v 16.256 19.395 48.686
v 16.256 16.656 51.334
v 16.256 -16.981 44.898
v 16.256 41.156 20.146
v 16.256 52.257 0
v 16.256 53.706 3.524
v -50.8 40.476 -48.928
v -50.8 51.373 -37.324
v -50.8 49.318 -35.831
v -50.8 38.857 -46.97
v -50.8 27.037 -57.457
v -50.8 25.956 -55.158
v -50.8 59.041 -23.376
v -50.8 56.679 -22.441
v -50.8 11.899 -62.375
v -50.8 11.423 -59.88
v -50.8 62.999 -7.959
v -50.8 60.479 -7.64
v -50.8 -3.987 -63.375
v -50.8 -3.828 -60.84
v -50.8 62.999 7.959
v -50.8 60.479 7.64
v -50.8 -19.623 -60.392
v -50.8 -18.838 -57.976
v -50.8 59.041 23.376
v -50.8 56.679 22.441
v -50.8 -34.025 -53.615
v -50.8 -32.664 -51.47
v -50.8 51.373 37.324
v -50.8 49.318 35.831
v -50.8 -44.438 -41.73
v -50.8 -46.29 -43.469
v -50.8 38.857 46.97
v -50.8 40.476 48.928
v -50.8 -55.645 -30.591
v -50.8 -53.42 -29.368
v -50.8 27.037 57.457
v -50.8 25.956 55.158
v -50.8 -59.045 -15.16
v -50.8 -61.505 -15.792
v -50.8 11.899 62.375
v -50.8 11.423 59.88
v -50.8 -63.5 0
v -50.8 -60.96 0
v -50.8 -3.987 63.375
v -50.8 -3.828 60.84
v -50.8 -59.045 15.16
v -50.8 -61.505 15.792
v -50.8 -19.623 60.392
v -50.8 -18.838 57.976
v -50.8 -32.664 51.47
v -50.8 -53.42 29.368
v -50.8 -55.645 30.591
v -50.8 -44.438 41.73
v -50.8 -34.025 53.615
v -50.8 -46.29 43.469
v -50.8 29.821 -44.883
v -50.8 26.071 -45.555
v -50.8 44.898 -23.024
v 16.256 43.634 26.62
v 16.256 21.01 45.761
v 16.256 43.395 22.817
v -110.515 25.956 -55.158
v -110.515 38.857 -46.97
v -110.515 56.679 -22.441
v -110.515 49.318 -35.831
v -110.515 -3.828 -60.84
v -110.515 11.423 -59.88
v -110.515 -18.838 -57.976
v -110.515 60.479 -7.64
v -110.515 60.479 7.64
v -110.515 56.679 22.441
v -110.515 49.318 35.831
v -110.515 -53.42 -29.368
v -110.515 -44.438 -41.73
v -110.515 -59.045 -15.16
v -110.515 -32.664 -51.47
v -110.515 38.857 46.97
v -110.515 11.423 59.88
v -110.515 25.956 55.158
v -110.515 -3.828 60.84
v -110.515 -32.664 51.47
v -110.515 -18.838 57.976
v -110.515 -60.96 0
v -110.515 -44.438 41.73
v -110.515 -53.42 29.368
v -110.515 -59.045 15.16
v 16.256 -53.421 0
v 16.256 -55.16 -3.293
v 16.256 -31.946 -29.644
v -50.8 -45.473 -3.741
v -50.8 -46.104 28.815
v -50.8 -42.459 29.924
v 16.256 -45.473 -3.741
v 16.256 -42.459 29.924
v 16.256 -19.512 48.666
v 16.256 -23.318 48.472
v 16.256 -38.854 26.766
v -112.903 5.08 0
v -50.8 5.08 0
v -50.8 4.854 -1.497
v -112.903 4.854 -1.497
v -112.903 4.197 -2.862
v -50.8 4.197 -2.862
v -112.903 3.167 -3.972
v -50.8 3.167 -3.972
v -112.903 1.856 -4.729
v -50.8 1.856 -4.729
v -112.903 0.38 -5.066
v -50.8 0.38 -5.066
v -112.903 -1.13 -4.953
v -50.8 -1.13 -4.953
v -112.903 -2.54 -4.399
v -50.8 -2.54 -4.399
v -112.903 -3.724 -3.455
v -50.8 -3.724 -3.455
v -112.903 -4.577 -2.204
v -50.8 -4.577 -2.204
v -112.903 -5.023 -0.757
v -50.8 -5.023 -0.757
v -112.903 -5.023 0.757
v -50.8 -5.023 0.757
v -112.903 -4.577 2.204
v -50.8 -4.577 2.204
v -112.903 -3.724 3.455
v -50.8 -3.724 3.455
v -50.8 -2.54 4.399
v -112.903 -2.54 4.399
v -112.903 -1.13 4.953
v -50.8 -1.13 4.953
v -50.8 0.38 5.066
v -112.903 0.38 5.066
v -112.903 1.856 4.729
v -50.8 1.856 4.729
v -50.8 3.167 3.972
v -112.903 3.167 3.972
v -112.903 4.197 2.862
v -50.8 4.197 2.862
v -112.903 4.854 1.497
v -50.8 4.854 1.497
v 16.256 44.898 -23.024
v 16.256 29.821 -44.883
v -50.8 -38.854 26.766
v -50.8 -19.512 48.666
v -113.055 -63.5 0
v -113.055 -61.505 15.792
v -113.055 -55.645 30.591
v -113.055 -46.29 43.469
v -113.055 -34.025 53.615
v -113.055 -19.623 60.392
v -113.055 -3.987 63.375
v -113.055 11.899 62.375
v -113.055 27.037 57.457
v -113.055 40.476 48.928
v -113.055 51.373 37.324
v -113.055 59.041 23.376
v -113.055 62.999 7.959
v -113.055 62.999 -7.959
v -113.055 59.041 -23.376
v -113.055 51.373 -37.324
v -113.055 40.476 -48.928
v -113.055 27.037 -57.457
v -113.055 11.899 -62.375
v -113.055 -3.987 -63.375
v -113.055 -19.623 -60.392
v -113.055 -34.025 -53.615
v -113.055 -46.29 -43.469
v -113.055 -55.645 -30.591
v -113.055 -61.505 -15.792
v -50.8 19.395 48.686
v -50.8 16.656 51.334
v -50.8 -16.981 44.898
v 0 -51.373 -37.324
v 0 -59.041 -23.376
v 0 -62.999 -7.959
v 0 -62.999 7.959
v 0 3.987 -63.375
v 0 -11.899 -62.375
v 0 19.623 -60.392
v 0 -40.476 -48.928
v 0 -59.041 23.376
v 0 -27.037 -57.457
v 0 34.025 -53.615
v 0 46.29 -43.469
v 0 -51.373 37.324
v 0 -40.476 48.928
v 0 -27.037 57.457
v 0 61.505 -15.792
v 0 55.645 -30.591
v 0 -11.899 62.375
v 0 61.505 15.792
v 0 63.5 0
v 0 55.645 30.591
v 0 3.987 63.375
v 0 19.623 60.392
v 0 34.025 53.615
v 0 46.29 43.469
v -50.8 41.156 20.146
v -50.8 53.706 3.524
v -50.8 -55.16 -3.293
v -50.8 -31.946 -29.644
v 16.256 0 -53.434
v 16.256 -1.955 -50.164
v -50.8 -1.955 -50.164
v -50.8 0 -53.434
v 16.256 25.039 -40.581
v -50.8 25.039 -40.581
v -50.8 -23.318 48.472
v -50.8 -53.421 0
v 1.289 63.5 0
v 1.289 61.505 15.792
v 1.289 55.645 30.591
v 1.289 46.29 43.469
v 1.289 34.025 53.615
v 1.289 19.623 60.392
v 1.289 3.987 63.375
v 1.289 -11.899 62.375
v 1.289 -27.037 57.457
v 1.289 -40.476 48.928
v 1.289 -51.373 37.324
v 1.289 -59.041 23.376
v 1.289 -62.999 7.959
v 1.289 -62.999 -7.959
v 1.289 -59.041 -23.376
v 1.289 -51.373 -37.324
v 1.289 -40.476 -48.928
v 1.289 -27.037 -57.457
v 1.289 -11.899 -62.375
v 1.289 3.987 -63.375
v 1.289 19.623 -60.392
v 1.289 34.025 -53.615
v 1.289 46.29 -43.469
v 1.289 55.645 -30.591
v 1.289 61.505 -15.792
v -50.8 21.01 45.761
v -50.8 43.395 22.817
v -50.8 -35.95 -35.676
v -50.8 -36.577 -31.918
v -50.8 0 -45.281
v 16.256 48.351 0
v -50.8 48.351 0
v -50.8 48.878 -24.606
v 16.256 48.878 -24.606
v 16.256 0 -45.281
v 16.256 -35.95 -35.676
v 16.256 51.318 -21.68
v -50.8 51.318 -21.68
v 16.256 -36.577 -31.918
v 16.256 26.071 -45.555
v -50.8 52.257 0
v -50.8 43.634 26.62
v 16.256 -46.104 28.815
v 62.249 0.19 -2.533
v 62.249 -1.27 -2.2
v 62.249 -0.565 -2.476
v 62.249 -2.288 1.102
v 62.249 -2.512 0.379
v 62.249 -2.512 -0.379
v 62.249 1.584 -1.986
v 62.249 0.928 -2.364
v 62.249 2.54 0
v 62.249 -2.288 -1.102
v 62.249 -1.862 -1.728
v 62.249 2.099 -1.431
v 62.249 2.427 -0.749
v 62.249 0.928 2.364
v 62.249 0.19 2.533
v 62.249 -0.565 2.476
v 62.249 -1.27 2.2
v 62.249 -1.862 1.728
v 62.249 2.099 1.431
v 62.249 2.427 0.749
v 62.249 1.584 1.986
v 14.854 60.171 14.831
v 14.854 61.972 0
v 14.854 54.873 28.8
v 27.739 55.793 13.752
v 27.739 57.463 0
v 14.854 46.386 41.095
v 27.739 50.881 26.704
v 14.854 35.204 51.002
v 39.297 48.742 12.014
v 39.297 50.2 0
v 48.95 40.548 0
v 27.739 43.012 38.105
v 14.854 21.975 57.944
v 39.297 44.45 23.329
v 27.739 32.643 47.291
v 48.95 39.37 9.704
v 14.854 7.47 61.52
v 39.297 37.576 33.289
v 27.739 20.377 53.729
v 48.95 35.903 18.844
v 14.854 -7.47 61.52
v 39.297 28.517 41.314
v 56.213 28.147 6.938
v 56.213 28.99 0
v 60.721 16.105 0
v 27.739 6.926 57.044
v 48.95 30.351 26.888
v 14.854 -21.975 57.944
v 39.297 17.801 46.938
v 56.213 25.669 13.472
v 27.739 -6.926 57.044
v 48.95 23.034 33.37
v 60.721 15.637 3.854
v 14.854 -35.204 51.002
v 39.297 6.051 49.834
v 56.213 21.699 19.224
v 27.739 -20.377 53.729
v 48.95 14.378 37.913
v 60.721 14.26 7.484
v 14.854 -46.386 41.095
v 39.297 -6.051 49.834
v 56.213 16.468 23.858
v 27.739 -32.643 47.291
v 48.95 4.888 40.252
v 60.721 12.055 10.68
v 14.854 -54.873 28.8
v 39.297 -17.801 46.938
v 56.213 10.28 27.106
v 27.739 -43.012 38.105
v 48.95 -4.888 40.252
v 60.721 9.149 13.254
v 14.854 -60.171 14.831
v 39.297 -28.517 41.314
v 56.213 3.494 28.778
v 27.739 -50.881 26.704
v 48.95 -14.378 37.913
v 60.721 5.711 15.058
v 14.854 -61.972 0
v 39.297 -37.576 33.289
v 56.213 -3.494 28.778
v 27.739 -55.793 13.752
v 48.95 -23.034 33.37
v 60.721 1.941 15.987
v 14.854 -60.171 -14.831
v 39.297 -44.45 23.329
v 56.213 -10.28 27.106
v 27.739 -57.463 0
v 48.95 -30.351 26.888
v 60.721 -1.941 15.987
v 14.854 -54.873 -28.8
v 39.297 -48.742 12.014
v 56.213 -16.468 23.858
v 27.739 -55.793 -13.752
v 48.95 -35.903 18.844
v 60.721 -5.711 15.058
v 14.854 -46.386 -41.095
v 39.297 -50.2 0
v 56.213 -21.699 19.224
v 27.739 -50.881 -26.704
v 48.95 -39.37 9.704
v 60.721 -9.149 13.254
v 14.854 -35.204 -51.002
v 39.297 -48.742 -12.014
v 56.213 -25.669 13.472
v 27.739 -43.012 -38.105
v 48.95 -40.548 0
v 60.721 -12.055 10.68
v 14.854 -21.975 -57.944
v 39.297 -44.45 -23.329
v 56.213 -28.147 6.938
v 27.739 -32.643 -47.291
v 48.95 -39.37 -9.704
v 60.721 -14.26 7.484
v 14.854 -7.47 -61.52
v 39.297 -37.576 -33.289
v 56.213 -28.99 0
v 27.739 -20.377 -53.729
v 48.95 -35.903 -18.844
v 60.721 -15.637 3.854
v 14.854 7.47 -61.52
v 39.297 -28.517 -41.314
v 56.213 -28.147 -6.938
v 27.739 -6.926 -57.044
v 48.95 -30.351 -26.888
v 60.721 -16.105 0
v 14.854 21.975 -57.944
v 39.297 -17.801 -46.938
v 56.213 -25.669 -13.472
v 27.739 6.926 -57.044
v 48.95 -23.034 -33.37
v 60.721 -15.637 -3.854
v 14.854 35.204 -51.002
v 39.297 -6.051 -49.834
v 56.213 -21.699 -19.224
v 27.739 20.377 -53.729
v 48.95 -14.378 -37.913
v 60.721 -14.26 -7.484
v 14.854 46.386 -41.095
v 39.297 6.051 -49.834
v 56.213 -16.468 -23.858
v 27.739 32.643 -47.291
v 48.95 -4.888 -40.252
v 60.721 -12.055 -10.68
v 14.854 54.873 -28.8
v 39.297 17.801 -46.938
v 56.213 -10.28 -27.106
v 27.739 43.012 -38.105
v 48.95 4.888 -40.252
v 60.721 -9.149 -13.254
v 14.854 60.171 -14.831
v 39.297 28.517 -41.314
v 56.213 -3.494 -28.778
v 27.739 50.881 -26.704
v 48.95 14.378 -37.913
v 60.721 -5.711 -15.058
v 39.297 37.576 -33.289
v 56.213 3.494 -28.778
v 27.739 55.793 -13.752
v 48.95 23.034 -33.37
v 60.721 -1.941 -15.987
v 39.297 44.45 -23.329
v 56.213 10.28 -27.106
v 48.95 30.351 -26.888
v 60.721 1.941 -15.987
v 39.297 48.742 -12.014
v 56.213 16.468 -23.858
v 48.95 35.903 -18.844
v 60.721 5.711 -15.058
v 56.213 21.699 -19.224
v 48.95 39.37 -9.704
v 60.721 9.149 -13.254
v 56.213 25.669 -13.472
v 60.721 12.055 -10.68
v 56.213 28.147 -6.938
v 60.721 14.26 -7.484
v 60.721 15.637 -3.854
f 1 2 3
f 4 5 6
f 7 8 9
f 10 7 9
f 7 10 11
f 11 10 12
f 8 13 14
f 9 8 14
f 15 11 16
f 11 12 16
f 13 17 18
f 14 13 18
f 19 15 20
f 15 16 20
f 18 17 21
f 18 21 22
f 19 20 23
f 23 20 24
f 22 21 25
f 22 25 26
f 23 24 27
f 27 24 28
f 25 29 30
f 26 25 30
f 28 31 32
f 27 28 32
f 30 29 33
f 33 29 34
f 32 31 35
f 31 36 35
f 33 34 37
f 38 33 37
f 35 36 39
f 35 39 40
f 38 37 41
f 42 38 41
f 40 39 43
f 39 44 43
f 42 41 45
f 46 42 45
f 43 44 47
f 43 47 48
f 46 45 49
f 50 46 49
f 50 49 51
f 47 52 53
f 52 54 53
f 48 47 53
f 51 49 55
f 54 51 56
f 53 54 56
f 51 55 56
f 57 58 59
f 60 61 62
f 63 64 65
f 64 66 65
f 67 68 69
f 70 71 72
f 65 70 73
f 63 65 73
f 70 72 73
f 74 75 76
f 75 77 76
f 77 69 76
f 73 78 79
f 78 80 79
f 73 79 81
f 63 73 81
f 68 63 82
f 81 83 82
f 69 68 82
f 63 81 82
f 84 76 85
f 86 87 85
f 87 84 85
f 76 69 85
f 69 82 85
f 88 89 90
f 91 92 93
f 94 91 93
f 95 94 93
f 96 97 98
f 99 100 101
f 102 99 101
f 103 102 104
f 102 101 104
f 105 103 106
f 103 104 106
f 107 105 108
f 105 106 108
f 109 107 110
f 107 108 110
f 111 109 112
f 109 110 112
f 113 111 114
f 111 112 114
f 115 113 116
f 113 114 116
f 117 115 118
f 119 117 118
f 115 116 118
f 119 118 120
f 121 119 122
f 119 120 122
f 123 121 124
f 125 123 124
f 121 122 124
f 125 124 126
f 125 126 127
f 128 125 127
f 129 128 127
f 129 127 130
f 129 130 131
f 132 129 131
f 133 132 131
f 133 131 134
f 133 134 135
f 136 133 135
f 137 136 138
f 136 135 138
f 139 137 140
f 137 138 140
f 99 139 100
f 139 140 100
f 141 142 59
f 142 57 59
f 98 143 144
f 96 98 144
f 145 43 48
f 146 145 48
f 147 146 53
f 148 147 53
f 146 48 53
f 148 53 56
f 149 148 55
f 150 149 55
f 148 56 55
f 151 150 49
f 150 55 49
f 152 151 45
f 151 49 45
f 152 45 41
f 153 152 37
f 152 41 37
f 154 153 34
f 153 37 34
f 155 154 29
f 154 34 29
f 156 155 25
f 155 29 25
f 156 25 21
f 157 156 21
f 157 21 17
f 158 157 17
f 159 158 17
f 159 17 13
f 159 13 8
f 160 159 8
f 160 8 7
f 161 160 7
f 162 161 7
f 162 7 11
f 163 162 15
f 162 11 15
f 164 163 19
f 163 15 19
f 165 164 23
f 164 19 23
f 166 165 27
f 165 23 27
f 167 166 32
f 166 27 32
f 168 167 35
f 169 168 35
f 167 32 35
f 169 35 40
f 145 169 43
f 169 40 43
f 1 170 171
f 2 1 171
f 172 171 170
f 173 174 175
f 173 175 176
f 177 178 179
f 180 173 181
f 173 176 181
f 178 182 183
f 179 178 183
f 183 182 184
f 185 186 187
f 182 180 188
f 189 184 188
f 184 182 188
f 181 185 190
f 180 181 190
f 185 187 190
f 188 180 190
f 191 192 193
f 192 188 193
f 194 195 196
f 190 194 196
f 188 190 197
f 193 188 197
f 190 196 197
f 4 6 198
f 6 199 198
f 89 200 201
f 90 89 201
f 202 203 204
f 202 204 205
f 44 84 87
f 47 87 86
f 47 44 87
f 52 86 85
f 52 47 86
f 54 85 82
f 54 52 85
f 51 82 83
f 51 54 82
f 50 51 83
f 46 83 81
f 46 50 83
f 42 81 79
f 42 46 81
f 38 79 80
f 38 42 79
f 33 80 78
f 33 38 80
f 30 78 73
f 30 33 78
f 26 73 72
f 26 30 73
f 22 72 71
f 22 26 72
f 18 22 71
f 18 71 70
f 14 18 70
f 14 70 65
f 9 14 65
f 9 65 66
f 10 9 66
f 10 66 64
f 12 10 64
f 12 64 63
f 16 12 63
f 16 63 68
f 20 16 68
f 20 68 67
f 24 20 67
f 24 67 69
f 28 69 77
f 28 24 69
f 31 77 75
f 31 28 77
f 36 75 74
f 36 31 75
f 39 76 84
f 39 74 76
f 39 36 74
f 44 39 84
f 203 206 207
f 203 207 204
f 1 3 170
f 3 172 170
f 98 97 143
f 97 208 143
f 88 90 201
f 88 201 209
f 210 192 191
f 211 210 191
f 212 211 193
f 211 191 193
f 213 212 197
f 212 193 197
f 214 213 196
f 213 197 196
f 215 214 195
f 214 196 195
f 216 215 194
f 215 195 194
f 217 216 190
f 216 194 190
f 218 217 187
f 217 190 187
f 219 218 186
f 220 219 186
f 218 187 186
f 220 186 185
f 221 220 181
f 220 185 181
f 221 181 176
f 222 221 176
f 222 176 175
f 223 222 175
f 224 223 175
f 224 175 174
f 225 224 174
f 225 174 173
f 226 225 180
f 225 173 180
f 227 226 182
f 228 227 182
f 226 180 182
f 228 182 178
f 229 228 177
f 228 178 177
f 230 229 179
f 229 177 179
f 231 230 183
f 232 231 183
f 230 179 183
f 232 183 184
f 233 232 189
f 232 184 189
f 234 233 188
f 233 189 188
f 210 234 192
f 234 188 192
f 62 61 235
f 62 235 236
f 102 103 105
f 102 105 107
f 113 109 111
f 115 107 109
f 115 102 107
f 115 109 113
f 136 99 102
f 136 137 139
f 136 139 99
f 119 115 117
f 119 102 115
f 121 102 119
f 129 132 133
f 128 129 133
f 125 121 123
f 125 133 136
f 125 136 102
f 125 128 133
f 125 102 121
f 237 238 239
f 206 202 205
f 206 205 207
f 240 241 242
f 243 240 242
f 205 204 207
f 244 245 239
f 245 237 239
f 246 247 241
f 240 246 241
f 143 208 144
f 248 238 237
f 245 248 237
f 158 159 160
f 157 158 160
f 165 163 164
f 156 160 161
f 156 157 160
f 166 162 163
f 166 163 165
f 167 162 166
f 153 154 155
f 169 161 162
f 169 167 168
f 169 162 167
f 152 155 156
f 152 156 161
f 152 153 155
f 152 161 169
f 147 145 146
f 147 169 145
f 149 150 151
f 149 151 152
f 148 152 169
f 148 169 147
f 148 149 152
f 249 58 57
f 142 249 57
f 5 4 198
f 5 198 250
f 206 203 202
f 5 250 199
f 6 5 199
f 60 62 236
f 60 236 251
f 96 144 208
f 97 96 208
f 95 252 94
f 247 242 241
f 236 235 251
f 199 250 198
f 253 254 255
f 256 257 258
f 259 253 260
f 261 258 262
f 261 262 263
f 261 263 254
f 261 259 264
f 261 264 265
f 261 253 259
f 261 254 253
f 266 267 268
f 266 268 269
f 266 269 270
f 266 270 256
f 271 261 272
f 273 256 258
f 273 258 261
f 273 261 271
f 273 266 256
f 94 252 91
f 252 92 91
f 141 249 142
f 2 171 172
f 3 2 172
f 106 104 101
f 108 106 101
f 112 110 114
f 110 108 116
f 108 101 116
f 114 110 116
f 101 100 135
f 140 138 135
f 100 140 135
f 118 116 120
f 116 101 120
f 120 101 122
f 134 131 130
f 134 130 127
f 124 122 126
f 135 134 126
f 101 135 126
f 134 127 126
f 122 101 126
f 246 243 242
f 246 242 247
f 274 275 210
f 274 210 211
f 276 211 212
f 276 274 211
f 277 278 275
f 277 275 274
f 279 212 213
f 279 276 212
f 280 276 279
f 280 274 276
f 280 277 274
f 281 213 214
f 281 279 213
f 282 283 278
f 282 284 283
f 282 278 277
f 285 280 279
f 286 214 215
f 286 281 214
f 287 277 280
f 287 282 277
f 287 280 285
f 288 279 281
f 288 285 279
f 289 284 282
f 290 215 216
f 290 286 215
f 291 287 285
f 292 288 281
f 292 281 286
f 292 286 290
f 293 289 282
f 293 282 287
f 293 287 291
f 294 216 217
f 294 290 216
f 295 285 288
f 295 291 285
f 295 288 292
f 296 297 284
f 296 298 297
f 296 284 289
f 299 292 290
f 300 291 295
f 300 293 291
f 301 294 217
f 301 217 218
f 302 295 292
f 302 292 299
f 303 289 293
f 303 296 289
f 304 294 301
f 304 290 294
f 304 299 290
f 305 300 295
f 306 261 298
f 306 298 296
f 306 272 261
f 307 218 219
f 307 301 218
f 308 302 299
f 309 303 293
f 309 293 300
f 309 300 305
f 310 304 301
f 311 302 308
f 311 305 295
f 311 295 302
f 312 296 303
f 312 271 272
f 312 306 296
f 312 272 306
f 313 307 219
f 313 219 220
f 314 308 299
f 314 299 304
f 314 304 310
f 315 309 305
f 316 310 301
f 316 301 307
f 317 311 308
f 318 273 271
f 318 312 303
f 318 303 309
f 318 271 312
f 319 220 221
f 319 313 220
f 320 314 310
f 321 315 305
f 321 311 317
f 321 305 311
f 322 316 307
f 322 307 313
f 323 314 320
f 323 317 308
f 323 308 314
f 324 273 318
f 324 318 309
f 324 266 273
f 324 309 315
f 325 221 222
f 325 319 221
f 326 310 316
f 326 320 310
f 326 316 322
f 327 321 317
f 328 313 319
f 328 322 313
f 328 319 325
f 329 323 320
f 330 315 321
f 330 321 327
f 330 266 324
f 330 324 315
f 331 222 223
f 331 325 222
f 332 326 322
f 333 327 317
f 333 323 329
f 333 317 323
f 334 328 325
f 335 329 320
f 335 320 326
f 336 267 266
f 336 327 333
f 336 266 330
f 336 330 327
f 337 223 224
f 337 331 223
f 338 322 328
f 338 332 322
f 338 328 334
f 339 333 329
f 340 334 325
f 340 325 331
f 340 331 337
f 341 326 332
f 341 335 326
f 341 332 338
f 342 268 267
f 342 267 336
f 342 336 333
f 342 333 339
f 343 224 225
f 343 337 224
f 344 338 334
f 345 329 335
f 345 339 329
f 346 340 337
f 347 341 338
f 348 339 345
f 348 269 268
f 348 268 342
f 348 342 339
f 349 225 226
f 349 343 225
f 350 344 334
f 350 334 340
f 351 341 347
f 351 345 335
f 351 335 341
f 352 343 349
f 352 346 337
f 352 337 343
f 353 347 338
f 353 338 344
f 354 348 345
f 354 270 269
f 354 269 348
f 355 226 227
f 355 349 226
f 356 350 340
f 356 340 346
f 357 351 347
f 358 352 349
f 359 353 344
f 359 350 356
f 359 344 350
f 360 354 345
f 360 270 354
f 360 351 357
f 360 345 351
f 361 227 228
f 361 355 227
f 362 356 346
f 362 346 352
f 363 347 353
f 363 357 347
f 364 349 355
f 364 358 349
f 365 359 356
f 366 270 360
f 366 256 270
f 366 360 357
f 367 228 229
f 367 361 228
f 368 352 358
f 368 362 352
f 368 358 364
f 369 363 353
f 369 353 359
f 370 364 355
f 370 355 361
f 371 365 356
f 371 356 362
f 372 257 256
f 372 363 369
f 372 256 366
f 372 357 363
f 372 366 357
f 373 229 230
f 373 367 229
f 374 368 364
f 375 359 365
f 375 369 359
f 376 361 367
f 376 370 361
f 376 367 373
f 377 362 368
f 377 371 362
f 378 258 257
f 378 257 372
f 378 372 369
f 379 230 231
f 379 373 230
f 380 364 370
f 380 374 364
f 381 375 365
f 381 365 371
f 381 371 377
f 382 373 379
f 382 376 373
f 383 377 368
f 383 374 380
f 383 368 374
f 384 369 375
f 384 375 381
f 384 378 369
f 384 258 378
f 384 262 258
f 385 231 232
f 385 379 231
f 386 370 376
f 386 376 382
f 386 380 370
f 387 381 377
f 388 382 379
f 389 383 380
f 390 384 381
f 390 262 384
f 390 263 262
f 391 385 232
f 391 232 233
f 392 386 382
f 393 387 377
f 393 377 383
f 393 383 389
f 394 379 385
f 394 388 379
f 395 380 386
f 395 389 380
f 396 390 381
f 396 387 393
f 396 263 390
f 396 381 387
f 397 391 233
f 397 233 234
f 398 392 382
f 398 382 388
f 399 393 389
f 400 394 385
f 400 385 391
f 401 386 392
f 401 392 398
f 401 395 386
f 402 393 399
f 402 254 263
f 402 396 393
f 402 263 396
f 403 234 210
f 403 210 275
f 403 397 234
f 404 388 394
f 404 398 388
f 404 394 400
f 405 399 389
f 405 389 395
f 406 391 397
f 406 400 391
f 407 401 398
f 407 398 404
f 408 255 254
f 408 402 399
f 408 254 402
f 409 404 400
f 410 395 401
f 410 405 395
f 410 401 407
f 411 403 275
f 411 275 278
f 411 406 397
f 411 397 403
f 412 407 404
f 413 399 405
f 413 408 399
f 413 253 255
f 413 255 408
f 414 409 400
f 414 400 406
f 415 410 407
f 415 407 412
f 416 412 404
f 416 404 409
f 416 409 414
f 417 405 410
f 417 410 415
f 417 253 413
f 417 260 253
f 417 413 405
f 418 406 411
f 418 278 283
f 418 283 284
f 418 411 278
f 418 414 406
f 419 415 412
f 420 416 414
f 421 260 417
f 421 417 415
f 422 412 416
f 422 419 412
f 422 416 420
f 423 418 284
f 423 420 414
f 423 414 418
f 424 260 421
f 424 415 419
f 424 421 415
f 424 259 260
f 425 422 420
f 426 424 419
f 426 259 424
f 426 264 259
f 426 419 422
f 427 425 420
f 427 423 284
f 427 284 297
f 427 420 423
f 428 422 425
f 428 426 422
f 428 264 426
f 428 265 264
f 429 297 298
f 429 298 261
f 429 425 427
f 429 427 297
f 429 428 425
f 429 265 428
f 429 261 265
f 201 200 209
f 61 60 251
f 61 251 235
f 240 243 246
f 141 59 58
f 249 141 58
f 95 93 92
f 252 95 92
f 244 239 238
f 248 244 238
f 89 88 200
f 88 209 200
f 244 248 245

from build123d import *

# Parameters (mm, degrees)
F0_R          = 63.5
F1_DEPTH      = 62.24945
F2_R          = 60.96
F4_DEPTH      = 50.8
F4_DEPTH_BACK = 16.256
F5_R          = 63.5
F6_DEPTH      = 62.2554
F7_T          = -2.54
F9_DEPTH      = 62.103


with BuildPart() as f1:
    # F0 (on Right) → F1 (new body)
    with BuildSketch(Plane.YZ):
        Circle(F0_R)
    extrude(amount=F1_DEPTH)

    # F2
    f2_edges = [f1.edges().sort_by_distance(p)[0] for p in [
        (62.24945, -63.5, 0),
    ]]
    fillet(f2_edges, radius=F2_R)


with BuildPart() as f4:
    # F3 (on Right) → F4 (new body, two sides)
    with BuildSketch(Plane.YZ) as f4_sk:
        Polygon((-1.955101948, -50.163542701), (0, -53.4336614103), (25.0391010195, -40.580611676), align=None)
    extrude(amount=-F4_DEPTH)
    extrude(f4_sk.sketch, amount=F4_DEPTH_BACK)


with BuildPart() as f4b:
    # F3 (on Right) → F4, piece 2 (new body, two sides)
    with BuildSketch(Plane.YZ) as f4_2_sk:
        Polygon((26.0707854024, -45.5552686947), (29.8210470804, -44.8832290032), (44.897697866, -23.0244621634), align=None)
    extrude(amount=-F4_DEPTH)
    extrude(f4_2_sk.sketch, amount=F4_DEPTH_BACK)


with BuildPart() as f4c:
    # F3 (on Right) → F4, piece 3 (new body, two sides)
    with BuildSketch(Plane.YZ) as f4_3_sk:
        Polygon((52.2568273798, 0), (53.7059360548, 3.5236606034), (41.1562249064, 20.1464034617), align=None)
    extrude(amount=-F4_DEPTH)
    extrude(f4_3_sk.sketch, amount=F4_DEPTH_BACK)


with BuildPart() as f4d:
    # F3 (on Right) → F4, piece 4 (new body, two sides)
    with BuildSketch(Plane.YZ) as f4_4_sk:
        Polygon((43.3945142875, 22.8171946295), (43.6342630245, 26.6196439116), (21.0098214447, 45.761115849), align=None)
    extrude(amount=-F4_DEPTH)
    extrude(f4_4_sk.sketch, amount=F4_DEPTH_BACK)


with BuildPart() as f4e:
    # F3 (on Right) → F4, piece 5 (new body, two sides)
    with BuildSketch(Plane.YZ) as f4_5_sk:
        Polygon((16.6557277501, 51.3344621912), (-16.9805381447, 44.897697866), (19.3950152489, 48.6863677823), align=None)
    extrude(amount=-F4_DEPTH)
    extrude(f4_5_sk.sketch, amount=F4_DEPTH_BACK)


with BuildPart() as f4f:
    # F3 (on Right) → F4, piece 6 (new body, two sides)
    with BuildSketch(Plane.YZ) as f4_6_sk:
        Polygon((48.3513660729, 0), (48.8783985368, -24.6061846119), (51.3182857052, -21.6799155529), align=None)
    extrude(amount=-F4_DEPTH)
    extrude(f4_6_sk.sketch, amount=F4_DEPTH_BACK)


with BuildPart() as f4g:
    # F3 (on Right) → F4, piece 7 (new body, two sides)
    with BuildSketch(Plane.YZ) as f4_7_sk:
        Polygon((-19.5124534153, 48.6656255959), (-23.3175503217, 48.4723963729), (-38.8537757099, 26.7659369856), align=None)
    extrude(amount=-F4_DEPTH)
    extrude(f4_7_sk.sketch, amount=F4_DEPTH_BACK)


with BuildPart() as f4h:
    # F3 (on Right) → F4, piece 8 (new body, two sides)
    with BuildSketch(Plane.YZ) as f4_8_sk:
        Polygon((-42.459197757, 29.9244048684), (-46.1041254278, 28.8150797244), (-45.4733073711, -3.7414748222), align=None)
    extrude(amount=-F4_DEPTH)
    extrude(f4_8_sk.sketch, amount=F4_DEPTH_BACK)


with BuildPart() as f4i:
    # F3 (on Right) → F4, piece 9 (new body, two sides)
    with BuildSketch(Plane.YZ) as f4_9_sk:
        Polygon((-31.946439296, -29.6439938247), (-53.4207742141, 0), (-55.1602899412, -3.2931519431), align=None)
    extrude(amount=-F4_DEPTH)
    extrude(f4_9_sk.sketch, amount=F4_DEPTH_BACK)


with BuildPart() as f4j:
    # F3 (on Right) → F4, piece 10 (new body, two sides)
    with BuildSketch(Plane.YZ) as f4_10_sk:
        Polygon((-36.5766024575, -31.9176514561), (-35.9502403438, -35.6758119772), (0, -45.280836776), align=None)
    extrude(amount=-F4_DEPTH)
    extrude(f4_10_sk.sketch, amount=F4_DEPTH_BACK)


with BuildPart() as f6:
    # F5 (on face) → F6 (new body)
    with BuildSketch(Plane(origin=(-50.8, 0, 0), x_dir=(0, -1, 0), z_dir=(-1, 0, 0))):
        Circle(F5_R)
    extrude(amount=F6_DEPTH)

    # F7
    f7_openings = [f6.faces().sort_by_distance(p)[0] for p in [
        (-50.8, 0, 0),
    ]]
    offset(amount=F7_T, openings=f7_openings)


with BuildPart() as f9:
    # F8 (on face) → F9 (new body)
    with BuildSketch(Plane(origin=(-50.8, 0, 0), x_dir=(0, -1, 0), z_dir=(-1, 0, 0))):
        with BuildLine():
            Line((-5.08, 0), (0, 0))
            Line((0, 0), (5.08, 0))
            ThreePointArc((5.08, 0), (0, 5.08), (-5.08, 0))
        make_face()
        with BuildLine():
            Line((5.08, 0), (0, 0))
            Line((0, 0), (-5.08, 0))
            ThreePointArc((-5.08, 0), (0, -5.08), (5.08, 0))
        make_face()
    extrude(amount=F9_DEPTH)


solid = Compound([f1.part, f4.part, f4b.part, f4c.part, f4d.part, f4e.part, f4f.part, f4g.part, f4h.part, f4i.part, f4j.part, f6.part, f9.part])
